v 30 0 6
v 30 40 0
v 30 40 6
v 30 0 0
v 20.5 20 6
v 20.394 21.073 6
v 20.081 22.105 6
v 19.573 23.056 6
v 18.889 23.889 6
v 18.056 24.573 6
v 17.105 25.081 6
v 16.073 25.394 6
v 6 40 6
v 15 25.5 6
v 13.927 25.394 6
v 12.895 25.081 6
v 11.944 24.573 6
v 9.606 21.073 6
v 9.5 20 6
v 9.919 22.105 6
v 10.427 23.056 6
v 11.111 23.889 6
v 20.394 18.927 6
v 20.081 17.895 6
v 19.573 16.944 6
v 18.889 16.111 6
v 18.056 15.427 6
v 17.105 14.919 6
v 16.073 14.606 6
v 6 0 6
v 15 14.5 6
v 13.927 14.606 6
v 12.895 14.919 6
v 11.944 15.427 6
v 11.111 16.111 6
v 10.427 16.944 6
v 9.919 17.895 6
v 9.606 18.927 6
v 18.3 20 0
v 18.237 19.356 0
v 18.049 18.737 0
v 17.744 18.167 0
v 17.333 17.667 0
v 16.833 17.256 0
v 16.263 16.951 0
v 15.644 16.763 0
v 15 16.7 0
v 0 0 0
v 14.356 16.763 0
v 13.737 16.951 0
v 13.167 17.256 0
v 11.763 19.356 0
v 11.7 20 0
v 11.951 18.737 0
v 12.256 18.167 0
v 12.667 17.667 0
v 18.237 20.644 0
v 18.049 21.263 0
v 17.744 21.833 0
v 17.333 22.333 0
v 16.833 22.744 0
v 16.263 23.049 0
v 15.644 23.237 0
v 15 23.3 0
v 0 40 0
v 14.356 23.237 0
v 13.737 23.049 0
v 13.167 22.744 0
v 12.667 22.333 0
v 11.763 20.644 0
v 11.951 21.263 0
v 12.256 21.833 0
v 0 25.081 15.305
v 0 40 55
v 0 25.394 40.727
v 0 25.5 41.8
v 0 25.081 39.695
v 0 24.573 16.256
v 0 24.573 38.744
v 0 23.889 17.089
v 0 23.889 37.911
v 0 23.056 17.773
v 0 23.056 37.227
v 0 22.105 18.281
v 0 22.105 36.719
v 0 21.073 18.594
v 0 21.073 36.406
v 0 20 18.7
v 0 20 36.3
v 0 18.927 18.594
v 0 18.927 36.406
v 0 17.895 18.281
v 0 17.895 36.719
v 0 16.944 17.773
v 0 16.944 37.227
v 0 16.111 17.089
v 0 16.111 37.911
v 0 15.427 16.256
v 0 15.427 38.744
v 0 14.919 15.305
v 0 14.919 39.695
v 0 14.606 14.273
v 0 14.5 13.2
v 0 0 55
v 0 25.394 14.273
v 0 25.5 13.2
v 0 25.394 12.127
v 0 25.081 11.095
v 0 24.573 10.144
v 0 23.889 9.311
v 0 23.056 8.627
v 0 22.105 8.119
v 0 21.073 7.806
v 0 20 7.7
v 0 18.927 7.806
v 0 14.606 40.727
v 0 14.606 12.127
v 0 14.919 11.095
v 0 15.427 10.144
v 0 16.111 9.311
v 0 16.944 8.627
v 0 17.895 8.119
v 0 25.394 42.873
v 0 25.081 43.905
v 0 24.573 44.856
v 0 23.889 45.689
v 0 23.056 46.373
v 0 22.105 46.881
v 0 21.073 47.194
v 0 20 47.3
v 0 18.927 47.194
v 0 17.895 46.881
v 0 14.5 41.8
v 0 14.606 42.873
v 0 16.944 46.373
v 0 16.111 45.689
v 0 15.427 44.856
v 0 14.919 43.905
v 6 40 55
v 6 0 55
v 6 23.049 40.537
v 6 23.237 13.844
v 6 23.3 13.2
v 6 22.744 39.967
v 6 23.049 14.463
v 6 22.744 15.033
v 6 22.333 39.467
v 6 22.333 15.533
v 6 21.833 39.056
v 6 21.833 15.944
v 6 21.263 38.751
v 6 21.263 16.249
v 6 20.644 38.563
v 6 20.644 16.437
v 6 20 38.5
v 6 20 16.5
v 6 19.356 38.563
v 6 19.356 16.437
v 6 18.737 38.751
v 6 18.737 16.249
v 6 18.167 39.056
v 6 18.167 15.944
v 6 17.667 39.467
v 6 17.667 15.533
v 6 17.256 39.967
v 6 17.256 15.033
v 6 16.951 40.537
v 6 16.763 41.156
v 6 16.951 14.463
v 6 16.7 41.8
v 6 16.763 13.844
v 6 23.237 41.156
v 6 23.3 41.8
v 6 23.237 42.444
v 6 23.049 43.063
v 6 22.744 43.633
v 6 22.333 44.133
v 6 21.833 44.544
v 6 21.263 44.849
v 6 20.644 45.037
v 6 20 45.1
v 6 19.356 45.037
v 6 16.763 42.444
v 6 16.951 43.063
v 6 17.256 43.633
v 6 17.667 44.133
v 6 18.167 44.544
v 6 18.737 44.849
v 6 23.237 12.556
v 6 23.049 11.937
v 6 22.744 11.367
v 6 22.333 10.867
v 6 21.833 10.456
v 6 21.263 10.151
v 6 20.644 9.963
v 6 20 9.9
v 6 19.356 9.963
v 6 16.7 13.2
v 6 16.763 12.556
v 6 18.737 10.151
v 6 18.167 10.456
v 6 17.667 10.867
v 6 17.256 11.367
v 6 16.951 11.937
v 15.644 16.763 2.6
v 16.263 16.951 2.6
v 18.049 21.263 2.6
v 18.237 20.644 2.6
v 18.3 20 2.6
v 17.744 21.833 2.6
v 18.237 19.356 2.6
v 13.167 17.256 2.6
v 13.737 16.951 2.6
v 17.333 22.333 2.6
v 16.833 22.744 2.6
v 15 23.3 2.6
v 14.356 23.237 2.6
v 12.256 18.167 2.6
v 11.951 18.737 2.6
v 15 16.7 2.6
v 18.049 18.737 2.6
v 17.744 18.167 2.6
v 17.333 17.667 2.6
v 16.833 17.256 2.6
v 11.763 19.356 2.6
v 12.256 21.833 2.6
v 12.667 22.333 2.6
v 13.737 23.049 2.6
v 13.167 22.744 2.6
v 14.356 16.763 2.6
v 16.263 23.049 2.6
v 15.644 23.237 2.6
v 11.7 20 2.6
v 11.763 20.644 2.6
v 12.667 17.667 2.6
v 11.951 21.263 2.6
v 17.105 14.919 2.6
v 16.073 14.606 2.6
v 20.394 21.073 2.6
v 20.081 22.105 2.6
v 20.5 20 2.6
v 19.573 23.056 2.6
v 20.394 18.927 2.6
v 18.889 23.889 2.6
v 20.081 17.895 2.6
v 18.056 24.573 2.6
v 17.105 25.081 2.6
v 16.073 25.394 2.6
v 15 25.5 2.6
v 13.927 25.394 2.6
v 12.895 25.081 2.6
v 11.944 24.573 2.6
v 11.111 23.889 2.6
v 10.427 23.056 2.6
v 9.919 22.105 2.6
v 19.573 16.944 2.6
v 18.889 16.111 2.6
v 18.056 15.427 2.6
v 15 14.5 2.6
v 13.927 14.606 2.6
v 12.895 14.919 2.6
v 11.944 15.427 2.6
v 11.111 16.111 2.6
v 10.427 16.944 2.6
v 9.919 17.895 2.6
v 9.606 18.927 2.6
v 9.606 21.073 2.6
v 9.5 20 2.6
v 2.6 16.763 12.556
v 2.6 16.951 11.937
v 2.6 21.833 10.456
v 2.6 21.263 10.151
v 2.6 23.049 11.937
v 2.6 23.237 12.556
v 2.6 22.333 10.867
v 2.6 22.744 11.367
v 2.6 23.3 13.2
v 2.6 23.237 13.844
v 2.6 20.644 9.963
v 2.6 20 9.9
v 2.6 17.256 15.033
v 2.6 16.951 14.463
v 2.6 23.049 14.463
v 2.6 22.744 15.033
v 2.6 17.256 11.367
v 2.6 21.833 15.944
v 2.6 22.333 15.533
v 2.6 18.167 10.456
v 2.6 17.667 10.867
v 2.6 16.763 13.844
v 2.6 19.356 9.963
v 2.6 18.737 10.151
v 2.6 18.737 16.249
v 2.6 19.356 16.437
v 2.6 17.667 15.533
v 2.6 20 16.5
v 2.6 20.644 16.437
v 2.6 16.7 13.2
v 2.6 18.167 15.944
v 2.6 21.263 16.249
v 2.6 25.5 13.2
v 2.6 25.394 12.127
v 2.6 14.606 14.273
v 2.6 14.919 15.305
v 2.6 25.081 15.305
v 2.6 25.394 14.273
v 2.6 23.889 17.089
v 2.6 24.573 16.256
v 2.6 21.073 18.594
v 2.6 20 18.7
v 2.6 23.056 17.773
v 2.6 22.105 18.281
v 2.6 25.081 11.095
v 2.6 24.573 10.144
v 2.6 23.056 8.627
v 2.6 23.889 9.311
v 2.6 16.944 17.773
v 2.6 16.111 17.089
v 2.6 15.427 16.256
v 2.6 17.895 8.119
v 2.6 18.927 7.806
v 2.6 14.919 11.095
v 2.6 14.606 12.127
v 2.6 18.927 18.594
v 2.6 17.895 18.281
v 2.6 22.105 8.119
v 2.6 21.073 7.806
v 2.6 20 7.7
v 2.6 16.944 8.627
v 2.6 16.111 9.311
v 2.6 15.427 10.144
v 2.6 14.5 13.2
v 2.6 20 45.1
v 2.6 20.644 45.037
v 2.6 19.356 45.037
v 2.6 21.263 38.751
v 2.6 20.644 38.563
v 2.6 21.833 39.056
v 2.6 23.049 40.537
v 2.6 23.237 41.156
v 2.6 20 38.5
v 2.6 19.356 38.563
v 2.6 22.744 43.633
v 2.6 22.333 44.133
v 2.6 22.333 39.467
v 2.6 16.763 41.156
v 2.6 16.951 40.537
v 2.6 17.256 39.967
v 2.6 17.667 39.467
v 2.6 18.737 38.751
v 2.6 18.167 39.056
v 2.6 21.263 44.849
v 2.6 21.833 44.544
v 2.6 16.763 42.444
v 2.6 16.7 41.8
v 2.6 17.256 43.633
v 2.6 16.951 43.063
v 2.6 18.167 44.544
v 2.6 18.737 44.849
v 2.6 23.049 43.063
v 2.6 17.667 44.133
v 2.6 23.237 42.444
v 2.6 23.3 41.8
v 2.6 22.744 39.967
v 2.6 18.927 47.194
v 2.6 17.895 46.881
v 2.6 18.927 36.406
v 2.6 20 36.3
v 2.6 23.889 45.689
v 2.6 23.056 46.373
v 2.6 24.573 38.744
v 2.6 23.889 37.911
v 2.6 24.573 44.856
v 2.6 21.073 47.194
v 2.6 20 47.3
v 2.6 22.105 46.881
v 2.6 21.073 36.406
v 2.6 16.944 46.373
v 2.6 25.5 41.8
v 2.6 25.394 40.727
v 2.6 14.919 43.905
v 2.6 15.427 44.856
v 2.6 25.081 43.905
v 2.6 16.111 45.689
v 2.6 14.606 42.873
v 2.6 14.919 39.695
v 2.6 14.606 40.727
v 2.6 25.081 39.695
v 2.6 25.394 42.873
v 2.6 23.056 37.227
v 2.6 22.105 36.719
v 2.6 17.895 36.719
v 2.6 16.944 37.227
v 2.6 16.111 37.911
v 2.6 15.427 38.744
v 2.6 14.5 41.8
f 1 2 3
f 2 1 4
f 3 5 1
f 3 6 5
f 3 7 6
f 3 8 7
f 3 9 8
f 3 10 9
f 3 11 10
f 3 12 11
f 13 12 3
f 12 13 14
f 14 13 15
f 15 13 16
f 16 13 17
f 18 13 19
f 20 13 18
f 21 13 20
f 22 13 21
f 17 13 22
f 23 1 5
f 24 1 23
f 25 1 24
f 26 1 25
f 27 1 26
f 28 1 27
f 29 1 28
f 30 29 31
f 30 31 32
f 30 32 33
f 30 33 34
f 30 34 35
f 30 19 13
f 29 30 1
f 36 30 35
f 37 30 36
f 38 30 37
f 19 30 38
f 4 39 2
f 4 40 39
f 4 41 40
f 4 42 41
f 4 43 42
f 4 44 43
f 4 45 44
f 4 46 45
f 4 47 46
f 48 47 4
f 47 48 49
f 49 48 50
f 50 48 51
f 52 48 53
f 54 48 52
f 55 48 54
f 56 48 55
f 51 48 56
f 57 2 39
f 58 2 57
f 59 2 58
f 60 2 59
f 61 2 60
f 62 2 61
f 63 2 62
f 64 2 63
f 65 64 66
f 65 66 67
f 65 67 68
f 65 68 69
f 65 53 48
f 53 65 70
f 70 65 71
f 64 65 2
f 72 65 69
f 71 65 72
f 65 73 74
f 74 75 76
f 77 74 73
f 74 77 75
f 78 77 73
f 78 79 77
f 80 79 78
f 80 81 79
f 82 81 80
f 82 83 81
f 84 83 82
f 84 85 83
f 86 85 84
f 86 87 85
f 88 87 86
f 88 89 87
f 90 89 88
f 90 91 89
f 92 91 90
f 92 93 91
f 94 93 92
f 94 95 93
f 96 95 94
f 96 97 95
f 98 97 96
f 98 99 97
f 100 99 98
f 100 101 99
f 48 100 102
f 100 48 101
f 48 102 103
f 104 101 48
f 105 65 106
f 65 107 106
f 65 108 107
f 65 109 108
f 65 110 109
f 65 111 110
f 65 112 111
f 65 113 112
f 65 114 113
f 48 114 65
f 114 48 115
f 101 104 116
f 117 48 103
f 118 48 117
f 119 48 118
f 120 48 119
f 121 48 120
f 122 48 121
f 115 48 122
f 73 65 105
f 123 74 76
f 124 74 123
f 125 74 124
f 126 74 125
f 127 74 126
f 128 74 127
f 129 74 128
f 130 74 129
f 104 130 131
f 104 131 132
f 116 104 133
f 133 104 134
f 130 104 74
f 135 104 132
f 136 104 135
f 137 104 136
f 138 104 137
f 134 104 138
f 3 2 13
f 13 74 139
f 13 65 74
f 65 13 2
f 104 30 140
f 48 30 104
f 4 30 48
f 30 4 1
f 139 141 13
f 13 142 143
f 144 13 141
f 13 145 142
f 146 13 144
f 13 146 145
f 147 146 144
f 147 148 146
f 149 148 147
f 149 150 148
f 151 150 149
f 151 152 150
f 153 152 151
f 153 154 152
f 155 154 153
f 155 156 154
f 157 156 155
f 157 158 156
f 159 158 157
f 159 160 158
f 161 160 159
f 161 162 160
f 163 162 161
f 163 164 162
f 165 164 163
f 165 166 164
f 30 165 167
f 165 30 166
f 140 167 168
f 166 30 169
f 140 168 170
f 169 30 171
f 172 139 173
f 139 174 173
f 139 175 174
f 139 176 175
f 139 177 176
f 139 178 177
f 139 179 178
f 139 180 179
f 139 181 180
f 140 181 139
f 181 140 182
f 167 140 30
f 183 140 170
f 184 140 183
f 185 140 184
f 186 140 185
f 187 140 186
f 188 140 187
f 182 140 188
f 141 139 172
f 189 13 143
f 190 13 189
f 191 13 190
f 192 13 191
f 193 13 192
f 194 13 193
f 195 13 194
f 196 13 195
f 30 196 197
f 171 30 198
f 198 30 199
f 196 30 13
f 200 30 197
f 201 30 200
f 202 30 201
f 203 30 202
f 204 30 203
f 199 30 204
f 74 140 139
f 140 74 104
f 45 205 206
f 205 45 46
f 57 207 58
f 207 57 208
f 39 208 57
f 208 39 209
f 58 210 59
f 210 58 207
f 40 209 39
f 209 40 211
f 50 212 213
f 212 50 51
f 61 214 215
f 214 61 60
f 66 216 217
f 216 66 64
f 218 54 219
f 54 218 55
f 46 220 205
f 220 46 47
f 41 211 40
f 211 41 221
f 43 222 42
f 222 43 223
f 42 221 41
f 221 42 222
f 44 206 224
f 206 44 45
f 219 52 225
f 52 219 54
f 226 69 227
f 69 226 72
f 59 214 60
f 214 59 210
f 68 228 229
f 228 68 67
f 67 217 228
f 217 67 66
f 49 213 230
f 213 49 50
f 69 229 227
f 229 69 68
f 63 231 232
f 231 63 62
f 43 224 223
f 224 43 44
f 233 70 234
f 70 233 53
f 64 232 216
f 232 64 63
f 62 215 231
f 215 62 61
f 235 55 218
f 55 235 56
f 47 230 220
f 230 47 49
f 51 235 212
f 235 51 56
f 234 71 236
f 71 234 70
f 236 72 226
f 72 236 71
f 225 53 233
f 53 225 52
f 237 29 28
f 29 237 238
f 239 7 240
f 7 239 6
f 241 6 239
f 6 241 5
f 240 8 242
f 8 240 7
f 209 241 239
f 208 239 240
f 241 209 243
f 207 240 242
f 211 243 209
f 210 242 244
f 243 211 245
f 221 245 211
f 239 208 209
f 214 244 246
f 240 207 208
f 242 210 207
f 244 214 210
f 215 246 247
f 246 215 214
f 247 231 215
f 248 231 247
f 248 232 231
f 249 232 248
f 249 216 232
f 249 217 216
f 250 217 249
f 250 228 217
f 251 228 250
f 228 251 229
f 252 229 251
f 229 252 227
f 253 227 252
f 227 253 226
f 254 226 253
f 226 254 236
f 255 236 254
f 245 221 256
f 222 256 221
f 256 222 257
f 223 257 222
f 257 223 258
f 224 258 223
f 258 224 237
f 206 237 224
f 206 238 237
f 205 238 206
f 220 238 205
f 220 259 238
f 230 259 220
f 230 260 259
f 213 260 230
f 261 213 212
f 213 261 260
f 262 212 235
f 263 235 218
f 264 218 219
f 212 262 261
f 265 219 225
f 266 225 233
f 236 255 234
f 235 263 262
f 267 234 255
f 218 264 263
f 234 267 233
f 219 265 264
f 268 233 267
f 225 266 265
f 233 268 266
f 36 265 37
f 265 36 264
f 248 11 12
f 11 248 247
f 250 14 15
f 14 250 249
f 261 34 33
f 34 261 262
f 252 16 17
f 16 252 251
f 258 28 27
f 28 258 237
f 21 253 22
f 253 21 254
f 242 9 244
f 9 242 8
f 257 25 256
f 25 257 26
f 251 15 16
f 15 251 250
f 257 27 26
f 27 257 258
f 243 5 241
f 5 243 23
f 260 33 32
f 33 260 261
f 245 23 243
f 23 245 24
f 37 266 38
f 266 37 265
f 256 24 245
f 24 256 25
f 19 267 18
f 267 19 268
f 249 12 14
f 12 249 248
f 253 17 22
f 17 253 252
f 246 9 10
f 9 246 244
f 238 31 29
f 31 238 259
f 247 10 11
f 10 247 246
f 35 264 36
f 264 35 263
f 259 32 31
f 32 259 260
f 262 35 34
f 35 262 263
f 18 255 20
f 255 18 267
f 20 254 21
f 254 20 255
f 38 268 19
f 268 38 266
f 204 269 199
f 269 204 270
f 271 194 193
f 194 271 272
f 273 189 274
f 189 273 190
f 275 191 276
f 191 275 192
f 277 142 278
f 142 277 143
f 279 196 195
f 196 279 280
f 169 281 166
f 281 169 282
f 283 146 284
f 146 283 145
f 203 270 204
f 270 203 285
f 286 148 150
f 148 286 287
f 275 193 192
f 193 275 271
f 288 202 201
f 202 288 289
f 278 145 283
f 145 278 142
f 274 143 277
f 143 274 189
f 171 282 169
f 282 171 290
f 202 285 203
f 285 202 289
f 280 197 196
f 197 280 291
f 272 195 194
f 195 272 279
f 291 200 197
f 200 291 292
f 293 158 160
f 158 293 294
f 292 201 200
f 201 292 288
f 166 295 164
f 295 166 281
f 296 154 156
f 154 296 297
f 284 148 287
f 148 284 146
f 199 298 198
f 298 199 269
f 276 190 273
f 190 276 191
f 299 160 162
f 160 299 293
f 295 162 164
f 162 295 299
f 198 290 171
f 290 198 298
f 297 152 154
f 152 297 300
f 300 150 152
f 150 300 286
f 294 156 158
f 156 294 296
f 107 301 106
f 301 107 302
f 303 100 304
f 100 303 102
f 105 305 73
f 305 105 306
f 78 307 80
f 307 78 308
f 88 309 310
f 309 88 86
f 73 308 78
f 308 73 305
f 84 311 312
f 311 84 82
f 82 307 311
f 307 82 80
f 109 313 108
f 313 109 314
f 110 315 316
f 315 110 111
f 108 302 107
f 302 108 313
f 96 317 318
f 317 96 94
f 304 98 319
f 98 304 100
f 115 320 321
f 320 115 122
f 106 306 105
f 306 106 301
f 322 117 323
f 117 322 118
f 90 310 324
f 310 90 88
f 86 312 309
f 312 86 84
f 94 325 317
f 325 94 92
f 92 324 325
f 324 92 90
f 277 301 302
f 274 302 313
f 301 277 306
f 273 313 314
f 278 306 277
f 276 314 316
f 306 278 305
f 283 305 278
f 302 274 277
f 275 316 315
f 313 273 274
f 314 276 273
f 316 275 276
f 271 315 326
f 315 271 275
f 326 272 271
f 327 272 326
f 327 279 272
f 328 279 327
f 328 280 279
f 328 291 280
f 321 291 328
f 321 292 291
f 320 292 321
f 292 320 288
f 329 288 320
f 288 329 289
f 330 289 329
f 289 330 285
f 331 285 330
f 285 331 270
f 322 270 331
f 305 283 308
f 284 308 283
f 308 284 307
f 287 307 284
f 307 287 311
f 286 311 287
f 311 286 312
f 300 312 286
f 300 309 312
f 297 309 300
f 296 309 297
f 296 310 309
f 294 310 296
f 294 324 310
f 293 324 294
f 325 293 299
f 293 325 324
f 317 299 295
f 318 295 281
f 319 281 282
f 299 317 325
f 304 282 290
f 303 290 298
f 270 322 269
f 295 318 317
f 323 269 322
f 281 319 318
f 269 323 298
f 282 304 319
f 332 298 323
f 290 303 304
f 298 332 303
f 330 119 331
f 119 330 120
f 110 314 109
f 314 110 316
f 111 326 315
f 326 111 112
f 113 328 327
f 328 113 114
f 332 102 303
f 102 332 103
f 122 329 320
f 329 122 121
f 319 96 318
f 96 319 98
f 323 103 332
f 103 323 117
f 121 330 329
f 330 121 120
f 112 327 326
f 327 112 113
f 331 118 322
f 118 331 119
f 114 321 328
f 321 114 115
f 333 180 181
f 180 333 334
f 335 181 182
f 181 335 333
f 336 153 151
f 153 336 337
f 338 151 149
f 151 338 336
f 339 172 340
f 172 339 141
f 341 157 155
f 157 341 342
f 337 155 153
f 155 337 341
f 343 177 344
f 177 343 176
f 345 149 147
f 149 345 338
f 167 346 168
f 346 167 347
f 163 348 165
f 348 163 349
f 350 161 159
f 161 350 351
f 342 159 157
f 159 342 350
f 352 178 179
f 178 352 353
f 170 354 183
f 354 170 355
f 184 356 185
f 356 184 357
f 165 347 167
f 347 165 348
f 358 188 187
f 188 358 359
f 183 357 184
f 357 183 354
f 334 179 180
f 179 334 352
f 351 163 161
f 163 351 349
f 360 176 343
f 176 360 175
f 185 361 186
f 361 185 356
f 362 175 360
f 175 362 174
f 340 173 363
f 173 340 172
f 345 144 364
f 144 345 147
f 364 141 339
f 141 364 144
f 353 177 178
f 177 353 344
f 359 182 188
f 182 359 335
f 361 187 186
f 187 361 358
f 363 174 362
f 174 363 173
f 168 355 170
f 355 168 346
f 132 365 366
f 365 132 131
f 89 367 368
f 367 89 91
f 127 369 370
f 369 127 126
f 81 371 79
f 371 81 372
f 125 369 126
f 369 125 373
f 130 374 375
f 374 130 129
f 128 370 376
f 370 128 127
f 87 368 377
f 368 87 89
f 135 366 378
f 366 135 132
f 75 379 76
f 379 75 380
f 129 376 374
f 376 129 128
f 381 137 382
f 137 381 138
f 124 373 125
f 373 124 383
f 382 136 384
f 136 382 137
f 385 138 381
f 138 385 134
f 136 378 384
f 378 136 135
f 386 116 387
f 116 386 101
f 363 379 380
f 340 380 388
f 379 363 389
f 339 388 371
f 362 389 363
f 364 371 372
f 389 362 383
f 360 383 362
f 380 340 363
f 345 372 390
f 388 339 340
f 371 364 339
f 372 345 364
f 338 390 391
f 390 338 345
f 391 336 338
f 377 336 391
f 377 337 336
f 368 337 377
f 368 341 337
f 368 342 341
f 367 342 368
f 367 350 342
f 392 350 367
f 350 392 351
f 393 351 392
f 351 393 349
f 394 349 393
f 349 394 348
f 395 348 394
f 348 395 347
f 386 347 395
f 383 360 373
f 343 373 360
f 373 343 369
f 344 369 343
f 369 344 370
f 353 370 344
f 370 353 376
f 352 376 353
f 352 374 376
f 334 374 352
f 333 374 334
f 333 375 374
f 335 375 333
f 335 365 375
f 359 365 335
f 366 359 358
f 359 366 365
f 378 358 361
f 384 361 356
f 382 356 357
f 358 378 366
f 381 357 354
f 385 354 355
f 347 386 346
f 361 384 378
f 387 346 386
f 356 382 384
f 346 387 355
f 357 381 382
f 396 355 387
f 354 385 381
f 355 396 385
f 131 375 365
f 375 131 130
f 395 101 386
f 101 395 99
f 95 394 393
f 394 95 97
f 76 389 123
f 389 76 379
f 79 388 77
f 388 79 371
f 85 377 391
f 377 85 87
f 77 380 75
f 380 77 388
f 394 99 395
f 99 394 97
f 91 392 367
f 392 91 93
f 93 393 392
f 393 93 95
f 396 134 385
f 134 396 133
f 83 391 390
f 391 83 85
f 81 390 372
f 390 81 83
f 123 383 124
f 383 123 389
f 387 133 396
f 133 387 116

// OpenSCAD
$fn = 32;

// ----------------------------------------------------------------------
// L-bracket: 30 x 40 x 55 mm
// ----------------------------------------------------------------------

// --- parameters (mm) ---
run_out = 30;             // horizontal leg, X
rise = 55;                // vertical leg, Z
bracket_w = 40;           // bracket depth, Y
sheet_t = 6;              // plate thickness
hole_d = 6.6;             // clearance for M6
cb_d = 11;                // counterbore seat
cb_h = 3.4;               // counterbore depth

module hole_z(px, py) {
  translate([px, py, -2.5]) cylinder(h = sheet_t + 5, d = hole_d);
}
module hole_x(pz, py) {
  translate([-2.5, py, pz]) rotate([0, 90, 0]) cylinder(h = sheet_t + 5, d = hole_d);
}
module cb_z(px, py) {
  translate([px, py, sheet_t - cb_h]) cylinder(h = cb_h + 0.4, d = cb_d);
}
module cb_x(pz, py) {
  translate([sheet_t - cb_h, py, pz]) rotate([0, -90, 0]) cylinder(h = cb_h + 0.4, d = cb_d);
}

difference() {
  union() {
    /* horizontal leg */
    cube([run_out, bracket_w, sheet_t]);
    /* vertical leg, overlapping the corner block */
    cube([sheet_t, bracket_w, rise]);
  }
  hole_z(15, 20);
  cb_z(15, 20);
  hole_x(13.2, 20);
  cb_x(13.2, 20);
  hole_x(41.8, 20);
  cb_x(41.8, 20);
}
